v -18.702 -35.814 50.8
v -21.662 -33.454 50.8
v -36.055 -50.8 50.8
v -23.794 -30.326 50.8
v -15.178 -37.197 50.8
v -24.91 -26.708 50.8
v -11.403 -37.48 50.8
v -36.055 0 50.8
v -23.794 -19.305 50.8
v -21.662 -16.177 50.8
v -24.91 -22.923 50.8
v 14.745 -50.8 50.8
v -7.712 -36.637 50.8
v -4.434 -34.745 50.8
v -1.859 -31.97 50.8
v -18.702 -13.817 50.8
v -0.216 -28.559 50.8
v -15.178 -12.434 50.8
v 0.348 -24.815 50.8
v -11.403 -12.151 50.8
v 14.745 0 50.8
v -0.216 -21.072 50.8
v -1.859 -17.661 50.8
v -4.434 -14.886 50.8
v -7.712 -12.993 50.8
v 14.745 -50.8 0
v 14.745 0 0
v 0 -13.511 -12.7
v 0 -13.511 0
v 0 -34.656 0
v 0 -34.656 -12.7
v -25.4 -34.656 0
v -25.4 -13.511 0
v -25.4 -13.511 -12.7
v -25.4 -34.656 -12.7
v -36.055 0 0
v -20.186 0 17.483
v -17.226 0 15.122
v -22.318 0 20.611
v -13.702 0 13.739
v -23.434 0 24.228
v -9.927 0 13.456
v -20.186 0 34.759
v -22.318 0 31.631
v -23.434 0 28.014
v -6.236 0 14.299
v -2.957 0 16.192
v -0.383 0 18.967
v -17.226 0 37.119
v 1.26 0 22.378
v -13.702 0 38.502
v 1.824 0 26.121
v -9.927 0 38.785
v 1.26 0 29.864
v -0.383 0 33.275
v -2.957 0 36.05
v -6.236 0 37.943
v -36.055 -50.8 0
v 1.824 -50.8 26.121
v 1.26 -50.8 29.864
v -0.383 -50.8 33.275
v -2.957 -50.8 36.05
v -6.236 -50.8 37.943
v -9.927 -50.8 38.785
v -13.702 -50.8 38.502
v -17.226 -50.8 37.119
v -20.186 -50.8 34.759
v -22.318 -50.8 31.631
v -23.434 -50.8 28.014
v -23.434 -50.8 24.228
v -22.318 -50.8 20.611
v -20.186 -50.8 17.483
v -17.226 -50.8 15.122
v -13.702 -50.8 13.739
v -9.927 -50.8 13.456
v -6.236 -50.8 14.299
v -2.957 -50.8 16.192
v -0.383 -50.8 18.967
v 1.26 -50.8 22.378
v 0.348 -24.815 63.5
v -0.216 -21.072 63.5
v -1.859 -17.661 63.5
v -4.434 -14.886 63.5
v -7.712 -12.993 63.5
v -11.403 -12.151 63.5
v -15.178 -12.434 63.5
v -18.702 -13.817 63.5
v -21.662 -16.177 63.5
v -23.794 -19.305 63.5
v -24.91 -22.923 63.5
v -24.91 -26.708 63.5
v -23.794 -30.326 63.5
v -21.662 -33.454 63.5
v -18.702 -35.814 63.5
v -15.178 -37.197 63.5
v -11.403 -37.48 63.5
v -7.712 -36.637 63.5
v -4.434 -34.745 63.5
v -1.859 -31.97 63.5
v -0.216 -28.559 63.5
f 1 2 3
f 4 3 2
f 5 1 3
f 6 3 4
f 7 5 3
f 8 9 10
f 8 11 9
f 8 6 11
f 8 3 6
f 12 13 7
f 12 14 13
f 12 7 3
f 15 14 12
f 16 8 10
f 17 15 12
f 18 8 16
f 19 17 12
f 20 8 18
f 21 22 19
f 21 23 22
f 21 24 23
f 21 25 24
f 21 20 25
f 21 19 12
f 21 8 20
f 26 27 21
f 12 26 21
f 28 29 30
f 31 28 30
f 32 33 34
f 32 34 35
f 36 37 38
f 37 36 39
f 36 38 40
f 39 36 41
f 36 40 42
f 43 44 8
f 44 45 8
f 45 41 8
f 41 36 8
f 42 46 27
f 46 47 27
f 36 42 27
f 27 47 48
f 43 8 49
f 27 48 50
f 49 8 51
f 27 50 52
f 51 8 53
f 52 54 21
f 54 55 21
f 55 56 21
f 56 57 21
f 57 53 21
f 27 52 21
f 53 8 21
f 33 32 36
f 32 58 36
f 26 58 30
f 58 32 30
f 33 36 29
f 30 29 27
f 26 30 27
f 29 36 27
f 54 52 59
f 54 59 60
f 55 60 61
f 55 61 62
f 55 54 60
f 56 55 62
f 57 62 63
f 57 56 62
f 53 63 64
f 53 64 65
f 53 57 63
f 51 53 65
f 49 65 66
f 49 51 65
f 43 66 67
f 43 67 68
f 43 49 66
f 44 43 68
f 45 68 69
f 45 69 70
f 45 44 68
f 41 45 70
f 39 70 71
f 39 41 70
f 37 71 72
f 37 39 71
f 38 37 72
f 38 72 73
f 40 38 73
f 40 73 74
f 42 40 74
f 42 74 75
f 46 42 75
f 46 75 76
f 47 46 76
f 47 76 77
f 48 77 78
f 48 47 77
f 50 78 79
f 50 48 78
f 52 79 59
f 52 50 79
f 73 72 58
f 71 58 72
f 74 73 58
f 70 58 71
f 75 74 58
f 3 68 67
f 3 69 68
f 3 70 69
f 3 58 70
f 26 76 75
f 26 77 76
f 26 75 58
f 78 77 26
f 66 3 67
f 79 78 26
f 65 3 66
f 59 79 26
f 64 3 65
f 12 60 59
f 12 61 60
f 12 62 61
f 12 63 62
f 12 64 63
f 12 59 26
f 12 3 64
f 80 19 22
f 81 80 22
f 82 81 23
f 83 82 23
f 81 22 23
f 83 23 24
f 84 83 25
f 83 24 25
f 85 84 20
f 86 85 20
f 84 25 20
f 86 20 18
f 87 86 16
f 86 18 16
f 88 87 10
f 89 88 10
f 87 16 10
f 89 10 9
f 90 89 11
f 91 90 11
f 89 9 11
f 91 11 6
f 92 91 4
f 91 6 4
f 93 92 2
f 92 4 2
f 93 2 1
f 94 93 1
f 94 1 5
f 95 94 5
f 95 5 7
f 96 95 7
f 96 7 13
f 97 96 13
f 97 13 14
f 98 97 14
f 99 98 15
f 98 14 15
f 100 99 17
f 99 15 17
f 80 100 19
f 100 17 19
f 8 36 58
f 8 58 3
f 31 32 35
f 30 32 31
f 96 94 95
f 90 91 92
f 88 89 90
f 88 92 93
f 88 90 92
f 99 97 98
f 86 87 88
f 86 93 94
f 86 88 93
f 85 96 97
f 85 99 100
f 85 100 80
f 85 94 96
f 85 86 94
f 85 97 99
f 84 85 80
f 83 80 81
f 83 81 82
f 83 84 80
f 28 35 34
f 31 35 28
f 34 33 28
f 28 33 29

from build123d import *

# Parameters (mm, degrees)
F0_W     = 50.8
F0_H     = 50.8
F0_R     = 12.7
F1_DEPTH = 50.8
F2_R     = 12.7
F3_DEPTH = 12.7
F4_W     = 25.4
F4_H     = 21.145677
F5_DEPTH = 12.7


with BuildPart() as f1:
    # F0 (on Front) → F1 (new body)
    with BuildSketch(Plane.XZ):
        with Locations((-10.655479, 25.4)):
            Rectangle(F0_W, F0_H)
        with Locations((-10.875792, 26.120912)):
            Circle(F0_R, mode=Mode.SUBTRACT)
    extrude(amount=F1_DEPTH)

    # F2 (on face) → F3 (join)
    with BuildSketch(Plane.XY.offset(50.8)):
        with Locations((-12.352031, -24.81534)):
            Circle(F2_R)
    extrude(amount=F3_DEPTH)

    # F4 (on face) → F5 (join)
    with BuildSketch(Plane(origin=(0, 0, 0), x_dir=(1, 0, 0), z_dir=(0, 0, -1))):
        with Locations((-12.7, 24.083575)):
            Rectangle(F4_W, F4_H)
    extrude(amount=F5_DEPTH)


solid = f1.part
